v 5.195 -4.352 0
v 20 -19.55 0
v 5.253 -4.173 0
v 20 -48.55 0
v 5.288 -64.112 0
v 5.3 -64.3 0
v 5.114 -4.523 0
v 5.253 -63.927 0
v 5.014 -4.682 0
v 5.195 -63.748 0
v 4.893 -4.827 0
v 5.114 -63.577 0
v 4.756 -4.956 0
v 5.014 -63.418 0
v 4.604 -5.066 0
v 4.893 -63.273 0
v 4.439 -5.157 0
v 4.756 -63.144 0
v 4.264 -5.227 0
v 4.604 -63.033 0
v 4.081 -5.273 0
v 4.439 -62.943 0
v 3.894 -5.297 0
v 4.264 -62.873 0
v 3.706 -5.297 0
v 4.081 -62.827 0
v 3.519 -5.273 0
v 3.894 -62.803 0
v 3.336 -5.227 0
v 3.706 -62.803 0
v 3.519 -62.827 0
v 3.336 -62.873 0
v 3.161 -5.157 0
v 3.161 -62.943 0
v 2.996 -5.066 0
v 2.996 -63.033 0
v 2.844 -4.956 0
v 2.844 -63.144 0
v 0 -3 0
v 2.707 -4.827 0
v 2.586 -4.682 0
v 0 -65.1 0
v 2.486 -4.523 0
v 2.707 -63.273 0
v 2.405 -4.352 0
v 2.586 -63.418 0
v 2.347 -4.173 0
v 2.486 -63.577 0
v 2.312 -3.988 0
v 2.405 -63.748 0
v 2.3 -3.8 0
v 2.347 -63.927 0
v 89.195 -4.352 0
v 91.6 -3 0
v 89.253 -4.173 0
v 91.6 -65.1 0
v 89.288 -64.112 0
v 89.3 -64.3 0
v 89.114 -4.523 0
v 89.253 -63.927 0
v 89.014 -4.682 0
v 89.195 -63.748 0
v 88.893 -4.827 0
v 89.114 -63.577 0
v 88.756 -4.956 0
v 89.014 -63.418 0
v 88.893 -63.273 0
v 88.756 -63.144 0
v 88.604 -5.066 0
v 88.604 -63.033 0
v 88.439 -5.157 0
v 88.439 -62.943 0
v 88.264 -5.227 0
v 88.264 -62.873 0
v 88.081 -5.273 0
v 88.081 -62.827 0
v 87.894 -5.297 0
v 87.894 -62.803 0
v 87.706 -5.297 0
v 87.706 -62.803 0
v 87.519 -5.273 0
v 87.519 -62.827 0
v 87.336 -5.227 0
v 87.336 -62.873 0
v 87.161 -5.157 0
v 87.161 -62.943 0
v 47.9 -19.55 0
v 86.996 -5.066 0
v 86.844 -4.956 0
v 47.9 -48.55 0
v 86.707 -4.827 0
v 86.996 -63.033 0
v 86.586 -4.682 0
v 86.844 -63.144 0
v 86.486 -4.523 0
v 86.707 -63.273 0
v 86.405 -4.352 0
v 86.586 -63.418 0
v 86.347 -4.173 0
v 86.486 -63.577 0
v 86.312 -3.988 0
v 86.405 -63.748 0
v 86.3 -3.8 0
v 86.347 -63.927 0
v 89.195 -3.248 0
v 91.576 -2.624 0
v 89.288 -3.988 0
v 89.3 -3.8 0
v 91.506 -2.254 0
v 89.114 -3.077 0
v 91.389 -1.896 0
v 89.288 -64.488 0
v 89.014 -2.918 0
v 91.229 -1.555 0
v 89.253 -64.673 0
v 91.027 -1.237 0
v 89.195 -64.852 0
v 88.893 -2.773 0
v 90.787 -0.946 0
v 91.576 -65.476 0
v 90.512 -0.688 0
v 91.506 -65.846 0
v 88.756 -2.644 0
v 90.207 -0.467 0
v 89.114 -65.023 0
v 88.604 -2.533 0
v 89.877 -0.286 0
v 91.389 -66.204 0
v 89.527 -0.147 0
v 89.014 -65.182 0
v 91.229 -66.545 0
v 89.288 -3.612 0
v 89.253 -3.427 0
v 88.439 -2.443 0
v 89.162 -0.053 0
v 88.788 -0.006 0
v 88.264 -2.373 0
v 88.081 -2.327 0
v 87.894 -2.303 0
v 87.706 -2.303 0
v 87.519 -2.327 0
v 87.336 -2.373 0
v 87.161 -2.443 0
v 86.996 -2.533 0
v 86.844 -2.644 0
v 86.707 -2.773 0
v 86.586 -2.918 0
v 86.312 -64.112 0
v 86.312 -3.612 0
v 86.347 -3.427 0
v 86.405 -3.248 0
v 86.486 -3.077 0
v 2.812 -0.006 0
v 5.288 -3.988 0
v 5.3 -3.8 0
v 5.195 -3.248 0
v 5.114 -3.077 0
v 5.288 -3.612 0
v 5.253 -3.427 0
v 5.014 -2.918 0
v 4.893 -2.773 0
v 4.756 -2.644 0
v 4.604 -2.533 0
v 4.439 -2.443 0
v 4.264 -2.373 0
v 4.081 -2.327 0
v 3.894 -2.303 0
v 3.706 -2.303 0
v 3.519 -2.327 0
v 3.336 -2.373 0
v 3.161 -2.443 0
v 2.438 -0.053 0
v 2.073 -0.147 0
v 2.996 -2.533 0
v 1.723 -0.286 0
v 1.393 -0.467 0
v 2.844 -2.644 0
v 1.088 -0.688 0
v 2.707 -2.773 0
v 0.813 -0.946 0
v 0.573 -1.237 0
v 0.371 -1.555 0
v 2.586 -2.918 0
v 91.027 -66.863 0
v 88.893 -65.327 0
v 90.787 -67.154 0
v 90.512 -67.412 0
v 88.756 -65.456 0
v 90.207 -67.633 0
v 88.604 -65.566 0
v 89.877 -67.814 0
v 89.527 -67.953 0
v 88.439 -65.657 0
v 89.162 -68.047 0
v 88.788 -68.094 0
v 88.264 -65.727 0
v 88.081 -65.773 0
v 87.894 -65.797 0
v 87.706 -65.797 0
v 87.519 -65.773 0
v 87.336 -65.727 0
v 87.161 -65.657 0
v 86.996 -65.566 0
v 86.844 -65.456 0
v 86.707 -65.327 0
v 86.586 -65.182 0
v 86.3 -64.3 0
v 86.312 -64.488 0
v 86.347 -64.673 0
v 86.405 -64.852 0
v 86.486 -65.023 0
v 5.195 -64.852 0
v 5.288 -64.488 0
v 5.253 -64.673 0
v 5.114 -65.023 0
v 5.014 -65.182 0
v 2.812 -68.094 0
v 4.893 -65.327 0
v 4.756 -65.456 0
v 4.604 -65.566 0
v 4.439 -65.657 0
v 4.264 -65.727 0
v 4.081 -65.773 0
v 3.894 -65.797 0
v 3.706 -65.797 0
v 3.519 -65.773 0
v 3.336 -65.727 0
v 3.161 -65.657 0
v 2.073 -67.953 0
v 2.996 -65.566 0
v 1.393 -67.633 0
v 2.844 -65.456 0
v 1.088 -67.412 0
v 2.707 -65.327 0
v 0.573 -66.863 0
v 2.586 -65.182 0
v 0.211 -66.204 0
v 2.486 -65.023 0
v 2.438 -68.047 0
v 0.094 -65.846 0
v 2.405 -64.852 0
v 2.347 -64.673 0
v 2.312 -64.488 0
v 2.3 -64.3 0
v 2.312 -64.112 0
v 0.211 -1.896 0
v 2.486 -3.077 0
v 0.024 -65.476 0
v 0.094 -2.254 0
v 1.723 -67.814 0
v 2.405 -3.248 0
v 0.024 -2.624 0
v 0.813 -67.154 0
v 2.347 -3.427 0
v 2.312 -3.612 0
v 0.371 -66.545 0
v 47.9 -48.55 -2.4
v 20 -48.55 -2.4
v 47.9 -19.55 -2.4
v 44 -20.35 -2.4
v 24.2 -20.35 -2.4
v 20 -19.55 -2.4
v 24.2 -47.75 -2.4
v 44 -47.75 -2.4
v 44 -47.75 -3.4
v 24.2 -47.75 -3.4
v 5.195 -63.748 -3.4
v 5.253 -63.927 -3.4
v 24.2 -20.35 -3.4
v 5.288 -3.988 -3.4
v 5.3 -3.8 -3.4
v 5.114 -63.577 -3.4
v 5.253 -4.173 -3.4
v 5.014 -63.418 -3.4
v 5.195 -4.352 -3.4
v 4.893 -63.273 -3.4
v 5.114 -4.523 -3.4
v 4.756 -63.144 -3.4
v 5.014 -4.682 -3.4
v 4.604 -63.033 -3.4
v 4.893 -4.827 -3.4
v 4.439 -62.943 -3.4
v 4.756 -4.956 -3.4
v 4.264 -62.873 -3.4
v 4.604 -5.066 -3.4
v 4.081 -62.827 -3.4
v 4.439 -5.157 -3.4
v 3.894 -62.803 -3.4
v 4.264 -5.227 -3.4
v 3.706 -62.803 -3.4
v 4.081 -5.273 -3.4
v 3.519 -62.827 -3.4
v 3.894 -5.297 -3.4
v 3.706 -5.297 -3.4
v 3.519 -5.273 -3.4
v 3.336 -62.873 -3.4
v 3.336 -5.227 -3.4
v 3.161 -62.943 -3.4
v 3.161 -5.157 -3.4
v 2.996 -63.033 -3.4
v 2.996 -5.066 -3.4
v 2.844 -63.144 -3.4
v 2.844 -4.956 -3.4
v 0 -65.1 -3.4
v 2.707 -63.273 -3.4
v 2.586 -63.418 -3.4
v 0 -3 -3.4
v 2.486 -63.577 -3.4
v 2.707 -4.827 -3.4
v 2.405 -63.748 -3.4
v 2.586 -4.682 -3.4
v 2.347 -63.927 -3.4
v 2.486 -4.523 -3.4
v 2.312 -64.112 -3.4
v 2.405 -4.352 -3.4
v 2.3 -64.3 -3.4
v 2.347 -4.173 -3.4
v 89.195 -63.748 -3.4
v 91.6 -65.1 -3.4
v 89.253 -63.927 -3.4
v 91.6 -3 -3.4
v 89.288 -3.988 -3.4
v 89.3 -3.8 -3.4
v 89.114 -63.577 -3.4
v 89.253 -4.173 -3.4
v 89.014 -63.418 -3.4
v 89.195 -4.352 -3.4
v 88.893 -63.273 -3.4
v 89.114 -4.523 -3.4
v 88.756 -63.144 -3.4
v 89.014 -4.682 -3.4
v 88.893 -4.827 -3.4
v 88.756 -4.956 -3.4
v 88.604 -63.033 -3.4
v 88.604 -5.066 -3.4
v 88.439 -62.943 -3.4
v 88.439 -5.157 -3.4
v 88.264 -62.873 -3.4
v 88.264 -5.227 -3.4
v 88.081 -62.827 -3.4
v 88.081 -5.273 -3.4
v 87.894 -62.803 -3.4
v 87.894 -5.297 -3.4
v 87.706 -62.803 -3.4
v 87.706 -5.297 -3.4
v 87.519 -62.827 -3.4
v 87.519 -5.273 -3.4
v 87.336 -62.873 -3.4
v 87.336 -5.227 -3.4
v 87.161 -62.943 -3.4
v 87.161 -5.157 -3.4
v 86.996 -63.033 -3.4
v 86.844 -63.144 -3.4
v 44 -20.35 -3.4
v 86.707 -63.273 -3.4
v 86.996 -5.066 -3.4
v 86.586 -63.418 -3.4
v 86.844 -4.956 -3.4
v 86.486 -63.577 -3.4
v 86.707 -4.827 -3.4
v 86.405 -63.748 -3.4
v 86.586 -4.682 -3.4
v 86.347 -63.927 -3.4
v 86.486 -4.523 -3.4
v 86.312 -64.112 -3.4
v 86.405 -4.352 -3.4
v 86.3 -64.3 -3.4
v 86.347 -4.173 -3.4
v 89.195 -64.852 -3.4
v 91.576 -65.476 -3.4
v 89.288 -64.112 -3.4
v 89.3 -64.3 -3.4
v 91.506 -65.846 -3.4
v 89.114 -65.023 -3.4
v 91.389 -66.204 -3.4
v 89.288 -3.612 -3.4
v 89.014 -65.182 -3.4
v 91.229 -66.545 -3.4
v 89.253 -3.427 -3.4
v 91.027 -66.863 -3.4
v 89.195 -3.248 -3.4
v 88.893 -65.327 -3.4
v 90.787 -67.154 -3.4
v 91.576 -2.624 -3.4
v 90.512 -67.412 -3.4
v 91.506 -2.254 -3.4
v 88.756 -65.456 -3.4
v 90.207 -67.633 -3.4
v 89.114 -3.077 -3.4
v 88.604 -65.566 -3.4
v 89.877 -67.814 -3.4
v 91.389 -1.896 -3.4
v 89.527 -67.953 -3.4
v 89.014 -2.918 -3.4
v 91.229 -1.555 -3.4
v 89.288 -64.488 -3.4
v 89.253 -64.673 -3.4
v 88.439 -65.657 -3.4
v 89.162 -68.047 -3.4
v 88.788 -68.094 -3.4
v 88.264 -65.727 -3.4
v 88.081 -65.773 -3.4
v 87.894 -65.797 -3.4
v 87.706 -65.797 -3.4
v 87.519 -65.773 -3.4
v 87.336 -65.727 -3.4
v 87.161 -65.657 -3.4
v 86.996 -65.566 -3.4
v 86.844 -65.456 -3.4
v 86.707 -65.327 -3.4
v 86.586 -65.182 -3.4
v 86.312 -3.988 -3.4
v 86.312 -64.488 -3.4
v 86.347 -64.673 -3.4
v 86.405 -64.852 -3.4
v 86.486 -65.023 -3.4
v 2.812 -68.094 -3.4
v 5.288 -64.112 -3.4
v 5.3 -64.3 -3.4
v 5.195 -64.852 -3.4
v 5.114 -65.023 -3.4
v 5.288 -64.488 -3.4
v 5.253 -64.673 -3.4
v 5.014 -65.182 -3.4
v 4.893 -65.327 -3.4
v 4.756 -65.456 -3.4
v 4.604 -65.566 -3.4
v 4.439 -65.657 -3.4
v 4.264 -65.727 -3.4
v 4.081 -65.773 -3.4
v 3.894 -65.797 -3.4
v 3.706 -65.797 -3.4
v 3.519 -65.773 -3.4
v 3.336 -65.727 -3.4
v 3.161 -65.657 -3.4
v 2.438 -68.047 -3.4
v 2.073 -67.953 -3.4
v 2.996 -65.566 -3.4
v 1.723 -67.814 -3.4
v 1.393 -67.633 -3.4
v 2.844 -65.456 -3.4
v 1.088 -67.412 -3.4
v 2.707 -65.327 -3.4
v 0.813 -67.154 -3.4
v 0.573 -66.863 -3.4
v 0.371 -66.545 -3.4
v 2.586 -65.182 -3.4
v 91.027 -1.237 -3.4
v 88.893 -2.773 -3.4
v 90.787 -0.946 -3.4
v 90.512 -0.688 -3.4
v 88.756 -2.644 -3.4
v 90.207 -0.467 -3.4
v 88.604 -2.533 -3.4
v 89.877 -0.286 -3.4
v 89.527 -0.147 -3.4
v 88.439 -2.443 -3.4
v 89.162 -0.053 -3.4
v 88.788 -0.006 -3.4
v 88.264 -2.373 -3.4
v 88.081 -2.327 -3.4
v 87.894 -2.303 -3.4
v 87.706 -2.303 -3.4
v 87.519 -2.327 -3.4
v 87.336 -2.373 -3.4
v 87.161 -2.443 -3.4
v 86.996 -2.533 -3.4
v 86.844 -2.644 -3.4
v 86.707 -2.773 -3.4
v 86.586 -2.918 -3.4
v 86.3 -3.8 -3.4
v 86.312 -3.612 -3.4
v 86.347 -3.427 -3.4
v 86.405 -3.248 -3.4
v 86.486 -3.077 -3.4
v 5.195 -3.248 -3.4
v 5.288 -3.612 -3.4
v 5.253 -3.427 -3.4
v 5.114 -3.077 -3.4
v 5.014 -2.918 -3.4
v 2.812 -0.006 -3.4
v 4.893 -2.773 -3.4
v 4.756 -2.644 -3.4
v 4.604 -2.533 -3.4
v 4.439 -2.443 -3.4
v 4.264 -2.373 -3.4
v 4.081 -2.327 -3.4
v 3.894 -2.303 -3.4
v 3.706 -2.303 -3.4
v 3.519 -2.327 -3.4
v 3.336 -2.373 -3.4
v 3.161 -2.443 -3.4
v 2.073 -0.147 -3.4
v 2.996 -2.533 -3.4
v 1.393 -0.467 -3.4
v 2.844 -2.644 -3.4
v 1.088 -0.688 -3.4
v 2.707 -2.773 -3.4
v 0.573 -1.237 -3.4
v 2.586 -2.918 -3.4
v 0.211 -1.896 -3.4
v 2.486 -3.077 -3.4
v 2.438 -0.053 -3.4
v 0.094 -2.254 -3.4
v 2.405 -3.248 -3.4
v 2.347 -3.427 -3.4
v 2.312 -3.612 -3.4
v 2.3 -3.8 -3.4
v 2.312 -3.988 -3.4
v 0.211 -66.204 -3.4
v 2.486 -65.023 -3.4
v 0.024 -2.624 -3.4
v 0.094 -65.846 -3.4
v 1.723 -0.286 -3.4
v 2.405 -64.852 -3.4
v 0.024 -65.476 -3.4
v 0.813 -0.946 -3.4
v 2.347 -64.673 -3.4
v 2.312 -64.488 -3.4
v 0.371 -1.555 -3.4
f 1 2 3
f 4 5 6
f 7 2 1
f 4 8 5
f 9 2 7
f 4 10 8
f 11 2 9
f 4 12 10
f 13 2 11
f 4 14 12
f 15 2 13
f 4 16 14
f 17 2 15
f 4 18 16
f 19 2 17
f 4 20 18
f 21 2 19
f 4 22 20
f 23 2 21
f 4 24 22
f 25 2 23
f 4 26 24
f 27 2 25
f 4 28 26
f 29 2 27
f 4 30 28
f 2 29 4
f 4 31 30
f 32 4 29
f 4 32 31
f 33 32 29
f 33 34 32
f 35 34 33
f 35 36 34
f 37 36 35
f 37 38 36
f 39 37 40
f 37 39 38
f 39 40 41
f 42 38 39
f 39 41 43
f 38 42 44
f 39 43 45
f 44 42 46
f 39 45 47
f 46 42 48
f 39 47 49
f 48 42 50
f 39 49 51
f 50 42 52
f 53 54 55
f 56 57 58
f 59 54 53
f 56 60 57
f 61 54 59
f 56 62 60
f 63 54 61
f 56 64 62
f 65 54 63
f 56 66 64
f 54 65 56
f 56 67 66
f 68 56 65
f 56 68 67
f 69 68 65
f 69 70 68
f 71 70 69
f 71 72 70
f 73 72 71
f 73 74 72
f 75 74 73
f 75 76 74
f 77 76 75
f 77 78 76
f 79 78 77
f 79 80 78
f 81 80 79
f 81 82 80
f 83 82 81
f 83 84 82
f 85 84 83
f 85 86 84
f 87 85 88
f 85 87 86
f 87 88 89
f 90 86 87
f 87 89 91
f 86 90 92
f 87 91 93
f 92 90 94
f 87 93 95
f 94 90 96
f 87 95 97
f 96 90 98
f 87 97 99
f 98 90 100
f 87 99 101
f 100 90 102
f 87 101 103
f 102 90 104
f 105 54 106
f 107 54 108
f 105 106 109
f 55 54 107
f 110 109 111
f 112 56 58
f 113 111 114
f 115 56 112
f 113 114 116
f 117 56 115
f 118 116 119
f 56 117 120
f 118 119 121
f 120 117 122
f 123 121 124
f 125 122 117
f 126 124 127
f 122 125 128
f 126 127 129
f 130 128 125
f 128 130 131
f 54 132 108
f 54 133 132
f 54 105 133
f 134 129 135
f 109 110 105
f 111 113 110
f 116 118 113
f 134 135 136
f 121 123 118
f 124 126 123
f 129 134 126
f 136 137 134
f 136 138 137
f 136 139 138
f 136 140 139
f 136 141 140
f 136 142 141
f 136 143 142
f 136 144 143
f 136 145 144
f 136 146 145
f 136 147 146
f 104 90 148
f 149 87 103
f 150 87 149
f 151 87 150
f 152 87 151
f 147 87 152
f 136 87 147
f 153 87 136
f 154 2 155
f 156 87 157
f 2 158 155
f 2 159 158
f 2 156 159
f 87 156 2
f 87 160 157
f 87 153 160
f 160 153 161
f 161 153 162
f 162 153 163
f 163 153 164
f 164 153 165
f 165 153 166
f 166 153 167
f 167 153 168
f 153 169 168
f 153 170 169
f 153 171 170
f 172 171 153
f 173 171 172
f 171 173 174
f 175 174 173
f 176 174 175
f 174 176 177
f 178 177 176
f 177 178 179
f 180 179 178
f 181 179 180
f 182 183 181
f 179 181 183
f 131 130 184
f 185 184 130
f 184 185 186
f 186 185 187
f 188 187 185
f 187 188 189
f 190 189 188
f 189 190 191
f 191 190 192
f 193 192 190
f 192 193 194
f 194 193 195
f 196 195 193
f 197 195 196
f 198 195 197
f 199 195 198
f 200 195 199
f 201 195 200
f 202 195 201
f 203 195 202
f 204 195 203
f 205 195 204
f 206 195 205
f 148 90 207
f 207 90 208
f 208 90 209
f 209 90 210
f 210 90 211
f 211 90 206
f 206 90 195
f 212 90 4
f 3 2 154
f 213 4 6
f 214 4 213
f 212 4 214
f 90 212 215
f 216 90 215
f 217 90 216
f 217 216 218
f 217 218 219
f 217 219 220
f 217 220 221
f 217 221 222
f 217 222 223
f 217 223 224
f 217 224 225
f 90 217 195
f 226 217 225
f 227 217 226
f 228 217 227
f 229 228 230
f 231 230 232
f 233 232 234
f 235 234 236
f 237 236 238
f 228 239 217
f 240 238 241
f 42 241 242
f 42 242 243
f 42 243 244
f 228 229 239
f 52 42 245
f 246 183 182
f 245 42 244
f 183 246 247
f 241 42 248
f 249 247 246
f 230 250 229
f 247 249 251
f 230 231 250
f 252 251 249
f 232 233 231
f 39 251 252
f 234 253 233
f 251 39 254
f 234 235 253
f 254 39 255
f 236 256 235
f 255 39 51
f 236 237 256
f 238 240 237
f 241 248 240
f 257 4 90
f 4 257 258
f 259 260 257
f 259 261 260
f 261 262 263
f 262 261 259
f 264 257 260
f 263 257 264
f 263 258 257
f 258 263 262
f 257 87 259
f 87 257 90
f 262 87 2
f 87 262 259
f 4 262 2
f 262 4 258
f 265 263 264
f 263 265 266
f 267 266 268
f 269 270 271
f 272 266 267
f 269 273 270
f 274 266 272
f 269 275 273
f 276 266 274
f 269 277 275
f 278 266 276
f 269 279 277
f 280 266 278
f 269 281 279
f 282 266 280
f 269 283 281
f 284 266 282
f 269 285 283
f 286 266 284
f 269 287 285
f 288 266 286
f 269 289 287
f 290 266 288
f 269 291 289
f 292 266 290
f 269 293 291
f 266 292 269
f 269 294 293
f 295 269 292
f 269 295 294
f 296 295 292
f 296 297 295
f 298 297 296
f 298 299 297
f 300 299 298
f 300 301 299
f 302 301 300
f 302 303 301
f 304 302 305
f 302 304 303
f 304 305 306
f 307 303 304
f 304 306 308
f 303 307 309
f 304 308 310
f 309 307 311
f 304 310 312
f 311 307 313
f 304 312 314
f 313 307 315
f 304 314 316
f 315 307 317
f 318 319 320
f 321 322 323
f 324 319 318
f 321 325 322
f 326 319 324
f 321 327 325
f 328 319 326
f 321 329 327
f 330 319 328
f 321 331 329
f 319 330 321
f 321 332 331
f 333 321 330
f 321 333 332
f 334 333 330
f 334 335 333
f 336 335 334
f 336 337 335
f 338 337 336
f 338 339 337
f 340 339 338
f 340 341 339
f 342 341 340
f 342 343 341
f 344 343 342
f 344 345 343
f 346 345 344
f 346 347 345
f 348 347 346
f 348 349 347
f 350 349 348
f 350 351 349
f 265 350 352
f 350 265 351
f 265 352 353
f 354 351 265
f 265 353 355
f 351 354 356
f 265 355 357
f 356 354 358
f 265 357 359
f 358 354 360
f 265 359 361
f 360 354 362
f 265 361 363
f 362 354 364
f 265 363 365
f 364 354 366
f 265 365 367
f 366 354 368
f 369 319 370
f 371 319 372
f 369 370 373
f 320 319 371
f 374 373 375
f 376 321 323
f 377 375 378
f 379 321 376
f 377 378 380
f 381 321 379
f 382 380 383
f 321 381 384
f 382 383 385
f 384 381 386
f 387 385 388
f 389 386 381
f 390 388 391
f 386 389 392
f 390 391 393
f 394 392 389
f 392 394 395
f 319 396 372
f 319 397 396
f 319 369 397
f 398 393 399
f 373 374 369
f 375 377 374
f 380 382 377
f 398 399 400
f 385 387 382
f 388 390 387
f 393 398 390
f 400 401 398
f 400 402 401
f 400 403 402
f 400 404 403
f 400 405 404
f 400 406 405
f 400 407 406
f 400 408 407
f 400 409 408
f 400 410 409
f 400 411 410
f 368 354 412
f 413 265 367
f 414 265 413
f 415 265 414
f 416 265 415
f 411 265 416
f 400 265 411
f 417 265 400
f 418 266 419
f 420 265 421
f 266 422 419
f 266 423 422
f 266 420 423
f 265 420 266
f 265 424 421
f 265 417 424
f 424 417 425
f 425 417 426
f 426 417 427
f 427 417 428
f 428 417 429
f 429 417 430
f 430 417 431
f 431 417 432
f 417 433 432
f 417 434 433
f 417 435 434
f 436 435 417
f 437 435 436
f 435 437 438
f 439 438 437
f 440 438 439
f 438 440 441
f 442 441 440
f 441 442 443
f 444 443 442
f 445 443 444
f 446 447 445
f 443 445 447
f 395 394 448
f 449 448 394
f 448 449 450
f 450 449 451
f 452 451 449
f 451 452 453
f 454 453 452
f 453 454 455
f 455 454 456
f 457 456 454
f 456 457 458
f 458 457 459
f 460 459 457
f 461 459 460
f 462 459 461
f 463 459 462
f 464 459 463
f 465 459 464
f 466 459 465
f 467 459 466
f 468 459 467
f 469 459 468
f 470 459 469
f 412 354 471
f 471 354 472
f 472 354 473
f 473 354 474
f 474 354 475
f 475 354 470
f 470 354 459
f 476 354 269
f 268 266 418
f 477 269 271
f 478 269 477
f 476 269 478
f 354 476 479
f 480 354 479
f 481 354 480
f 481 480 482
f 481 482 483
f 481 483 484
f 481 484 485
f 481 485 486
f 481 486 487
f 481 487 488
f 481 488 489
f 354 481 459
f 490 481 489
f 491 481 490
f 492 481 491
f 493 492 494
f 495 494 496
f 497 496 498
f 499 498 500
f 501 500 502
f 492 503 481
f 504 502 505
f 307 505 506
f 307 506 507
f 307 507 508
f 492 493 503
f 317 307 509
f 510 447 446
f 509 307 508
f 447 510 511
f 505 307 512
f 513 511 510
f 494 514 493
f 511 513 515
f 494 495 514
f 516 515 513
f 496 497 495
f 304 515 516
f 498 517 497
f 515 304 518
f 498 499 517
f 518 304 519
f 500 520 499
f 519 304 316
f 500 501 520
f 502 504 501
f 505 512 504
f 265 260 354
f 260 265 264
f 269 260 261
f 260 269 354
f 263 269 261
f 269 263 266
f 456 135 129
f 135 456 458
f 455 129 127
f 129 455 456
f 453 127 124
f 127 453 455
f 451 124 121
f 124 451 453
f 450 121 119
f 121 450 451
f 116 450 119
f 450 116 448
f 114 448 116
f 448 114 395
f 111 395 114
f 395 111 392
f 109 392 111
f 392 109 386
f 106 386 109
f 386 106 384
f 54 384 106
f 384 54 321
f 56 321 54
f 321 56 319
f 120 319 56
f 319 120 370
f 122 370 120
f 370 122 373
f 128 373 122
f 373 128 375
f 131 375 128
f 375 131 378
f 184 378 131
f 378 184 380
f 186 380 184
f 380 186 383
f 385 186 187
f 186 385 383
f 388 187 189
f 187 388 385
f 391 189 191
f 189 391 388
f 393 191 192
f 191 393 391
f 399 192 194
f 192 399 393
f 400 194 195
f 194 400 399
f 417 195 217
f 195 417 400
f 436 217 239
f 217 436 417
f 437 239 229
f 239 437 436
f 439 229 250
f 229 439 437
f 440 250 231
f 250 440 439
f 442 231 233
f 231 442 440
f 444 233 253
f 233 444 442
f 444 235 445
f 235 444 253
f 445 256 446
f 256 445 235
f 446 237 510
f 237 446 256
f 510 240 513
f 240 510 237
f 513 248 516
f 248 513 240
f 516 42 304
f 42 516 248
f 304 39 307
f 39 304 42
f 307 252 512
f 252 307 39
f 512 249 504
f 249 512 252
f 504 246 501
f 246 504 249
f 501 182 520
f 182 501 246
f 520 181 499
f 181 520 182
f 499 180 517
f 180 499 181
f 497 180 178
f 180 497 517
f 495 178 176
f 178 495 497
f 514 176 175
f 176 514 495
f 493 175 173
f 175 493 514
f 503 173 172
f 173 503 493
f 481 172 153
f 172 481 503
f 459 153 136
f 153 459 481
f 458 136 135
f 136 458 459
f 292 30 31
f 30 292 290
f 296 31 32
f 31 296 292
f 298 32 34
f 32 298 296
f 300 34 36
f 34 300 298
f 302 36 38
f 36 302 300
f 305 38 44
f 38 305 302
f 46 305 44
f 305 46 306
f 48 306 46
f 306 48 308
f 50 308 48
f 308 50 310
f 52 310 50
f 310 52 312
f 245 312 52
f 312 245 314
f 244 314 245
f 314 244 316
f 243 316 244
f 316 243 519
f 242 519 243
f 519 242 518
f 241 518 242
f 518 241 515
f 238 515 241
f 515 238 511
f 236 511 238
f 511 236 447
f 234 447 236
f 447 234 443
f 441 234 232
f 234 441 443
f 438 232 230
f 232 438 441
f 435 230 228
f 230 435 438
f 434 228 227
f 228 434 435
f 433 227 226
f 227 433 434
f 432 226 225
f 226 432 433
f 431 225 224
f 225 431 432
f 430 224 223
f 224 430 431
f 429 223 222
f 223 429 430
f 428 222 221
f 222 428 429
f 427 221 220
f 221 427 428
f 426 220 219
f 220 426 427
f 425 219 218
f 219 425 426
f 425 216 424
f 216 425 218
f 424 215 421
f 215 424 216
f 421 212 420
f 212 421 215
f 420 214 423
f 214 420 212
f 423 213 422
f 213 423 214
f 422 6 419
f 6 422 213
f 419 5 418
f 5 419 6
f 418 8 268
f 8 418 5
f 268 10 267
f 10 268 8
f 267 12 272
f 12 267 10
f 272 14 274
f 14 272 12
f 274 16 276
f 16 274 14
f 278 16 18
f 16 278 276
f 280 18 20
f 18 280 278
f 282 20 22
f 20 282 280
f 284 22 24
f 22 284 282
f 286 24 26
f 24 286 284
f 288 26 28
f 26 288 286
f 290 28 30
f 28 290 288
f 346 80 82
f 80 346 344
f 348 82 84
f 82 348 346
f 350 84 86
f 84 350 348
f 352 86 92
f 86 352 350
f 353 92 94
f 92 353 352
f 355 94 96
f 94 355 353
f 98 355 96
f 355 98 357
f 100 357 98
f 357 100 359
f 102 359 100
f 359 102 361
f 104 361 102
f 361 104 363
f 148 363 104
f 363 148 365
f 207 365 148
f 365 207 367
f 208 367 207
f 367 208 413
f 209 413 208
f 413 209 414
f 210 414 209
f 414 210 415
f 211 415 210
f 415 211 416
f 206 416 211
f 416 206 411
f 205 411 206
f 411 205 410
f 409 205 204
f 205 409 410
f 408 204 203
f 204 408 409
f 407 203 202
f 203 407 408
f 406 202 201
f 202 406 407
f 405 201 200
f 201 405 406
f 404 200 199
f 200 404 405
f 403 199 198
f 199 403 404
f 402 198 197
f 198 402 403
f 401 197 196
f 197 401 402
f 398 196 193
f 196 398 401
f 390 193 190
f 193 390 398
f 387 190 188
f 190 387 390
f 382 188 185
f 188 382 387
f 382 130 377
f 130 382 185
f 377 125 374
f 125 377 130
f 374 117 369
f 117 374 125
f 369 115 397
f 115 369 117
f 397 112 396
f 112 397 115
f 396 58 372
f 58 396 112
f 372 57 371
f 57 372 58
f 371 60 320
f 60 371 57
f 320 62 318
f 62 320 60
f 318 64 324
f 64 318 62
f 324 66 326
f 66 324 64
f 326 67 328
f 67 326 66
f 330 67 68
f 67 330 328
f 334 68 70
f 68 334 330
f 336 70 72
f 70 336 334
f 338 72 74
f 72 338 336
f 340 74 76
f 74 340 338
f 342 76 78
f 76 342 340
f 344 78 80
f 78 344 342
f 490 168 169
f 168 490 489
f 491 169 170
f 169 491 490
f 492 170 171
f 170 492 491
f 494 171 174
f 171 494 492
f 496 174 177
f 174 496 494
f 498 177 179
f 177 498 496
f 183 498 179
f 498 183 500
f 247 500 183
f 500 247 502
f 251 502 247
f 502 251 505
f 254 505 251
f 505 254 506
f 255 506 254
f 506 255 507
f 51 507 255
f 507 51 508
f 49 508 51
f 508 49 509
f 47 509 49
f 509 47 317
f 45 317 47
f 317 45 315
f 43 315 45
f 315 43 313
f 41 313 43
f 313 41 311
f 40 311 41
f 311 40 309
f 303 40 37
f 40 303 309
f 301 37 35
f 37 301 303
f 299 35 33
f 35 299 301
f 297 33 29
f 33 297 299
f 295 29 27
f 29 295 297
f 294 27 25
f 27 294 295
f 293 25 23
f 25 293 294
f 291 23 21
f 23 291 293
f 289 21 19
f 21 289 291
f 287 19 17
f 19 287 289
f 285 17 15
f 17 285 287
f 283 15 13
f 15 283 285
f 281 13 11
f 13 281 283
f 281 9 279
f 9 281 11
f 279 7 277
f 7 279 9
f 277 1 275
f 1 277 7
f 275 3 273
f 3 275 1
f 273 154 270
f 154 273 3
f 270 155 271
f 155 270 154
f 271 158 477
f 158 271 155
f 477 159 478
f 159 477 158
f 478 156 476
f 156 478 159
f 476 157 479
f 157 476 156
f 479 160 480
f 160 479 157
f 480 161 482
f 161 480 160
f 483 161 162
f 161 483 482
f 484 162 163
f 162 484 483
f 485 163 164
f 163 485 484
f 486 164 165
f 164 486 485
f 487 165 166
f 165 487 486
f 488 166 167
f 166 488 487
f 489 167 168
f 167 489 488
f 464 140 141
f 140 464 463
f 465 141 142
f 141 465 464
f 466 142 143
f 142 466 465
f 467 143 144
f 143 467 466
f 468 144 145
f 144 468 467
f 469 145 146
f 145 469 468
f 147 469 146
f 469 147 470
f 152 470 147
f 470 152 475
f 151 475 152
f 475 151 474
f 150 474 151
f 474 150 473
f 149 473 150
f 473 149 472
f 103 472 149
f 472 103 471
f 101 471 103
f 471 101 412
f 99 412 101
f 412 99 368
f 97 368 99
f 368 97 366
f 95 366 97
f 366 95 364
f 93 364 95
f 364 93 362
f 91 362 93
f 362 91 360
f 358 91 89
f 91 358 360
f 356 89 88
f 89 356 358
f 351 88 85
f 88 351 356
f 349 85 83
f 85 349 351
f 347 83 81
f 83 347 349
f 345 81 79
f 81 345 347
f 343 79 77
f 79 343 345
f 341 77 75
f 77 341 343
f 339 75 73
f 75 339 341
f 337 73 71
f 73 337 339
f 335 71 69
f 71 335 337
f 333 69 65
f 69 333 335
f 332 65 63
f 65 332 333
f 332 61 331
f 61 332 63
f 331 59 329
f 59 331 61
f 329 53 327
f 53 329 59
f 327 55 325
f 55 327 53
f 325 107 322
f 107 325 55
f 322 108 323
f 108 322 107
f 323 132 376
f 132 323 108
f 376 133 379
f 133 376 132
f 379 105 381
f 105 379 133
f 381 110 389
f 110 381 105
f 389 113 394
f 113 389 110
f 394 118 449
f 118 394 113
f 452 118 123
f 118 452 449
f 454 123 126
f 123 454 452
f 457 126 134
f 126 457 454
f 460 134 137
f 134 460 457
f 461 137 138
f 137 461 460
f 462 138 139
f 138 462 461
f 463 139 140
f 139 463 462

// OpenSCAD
$fn = 50;

LENGTH=91.6;
WIDTH=68.1;
THICKNESS=5.9;
ROUNDED=3.0;
HOLE_DISTANCE=3.8;
HOLE_RADIUS=1.5;

PCB_LENGTH=28.2+0.8;
PCB_WIDTH=27.1+0.8;
PCB_THICKNESS=3.4;
SCREEN_LENGTH=26.6+0.8;
SCREEN_WIDTH=19.0+0.8;
SCREEN_X=(PCB_LENGTH-SCREEN_LENGTH)/2;
SCREEN_Y=4.2;
HEADER_LENGTH=11;
HEADER_WIDTH=3;
HEADER_X=(PCB_LENGTH-HEADER_LENGTH)/2;

module screen() {
    union() {
        linear_extrude(PCB_THICKNESS-1)
            square([PCB_LENGTH,PCB_WIDTH], false);
        linear_extrude(PCB_THICKNESS)
            translate([SCREEN_X,SCREEN_Y])
                square([SCREEN_LENGTH,SCREEN_WIDTH], false);
        translate([HEADER_X,0,-PCB_THICKNESS-1])
            linear_extrude(PCB_THICKNESS+1)
                square([HEADER_LENGTH,HEADER_WIDTH], false);
    }
}

module base(thickness) {
    linear_extrude(thickness)
    difference() {
        translate([ROUNDED,ROUNDED])
        minkowski() {
            square([LENGTH-ROUNDED*2, WIDTH-ROUNDED*2], false);
            circle(ROUNDED);
        }
        translate([HOLE_DISTANCE,HOLE_DISTANCE]) circle(HOLE_RADIUS);
        translate([LENGTH-HOLE_DISTANCE,HOLE_DISTANCE]) circle(HOLE_RADIUS);
        translate([HOLE_DISTANCE,WIDTH-HOLE_DISTANCE]) circle(HOLE_RADIUS);
        translate([LENGTH-HOLE_DISTANCE,WIDTH-HOLE_DISTANCE]) circle(HOLE_RADIUS);
    }
}

module top() {
    difference() {
        base(PCB_THICKNESS);
        translate([20,(WIDTH-PCB_LENGTH)/2]) translate([0,PCB_LENGTH]) rotate([0,0,-90]) screen();
    }
}

module bottom() {
    difference() {
        base(THICKNESS - PCB_THICKNESS);
        translate([20,(WIDTH-PCB_LENGTH)/2,PCB_THICKNESS]) 
        translate([0,PCB_LENGTH]) rotate([0,0,-90]) screen();
    }
}

rotate([180,0,0]) top();
//bottom();
